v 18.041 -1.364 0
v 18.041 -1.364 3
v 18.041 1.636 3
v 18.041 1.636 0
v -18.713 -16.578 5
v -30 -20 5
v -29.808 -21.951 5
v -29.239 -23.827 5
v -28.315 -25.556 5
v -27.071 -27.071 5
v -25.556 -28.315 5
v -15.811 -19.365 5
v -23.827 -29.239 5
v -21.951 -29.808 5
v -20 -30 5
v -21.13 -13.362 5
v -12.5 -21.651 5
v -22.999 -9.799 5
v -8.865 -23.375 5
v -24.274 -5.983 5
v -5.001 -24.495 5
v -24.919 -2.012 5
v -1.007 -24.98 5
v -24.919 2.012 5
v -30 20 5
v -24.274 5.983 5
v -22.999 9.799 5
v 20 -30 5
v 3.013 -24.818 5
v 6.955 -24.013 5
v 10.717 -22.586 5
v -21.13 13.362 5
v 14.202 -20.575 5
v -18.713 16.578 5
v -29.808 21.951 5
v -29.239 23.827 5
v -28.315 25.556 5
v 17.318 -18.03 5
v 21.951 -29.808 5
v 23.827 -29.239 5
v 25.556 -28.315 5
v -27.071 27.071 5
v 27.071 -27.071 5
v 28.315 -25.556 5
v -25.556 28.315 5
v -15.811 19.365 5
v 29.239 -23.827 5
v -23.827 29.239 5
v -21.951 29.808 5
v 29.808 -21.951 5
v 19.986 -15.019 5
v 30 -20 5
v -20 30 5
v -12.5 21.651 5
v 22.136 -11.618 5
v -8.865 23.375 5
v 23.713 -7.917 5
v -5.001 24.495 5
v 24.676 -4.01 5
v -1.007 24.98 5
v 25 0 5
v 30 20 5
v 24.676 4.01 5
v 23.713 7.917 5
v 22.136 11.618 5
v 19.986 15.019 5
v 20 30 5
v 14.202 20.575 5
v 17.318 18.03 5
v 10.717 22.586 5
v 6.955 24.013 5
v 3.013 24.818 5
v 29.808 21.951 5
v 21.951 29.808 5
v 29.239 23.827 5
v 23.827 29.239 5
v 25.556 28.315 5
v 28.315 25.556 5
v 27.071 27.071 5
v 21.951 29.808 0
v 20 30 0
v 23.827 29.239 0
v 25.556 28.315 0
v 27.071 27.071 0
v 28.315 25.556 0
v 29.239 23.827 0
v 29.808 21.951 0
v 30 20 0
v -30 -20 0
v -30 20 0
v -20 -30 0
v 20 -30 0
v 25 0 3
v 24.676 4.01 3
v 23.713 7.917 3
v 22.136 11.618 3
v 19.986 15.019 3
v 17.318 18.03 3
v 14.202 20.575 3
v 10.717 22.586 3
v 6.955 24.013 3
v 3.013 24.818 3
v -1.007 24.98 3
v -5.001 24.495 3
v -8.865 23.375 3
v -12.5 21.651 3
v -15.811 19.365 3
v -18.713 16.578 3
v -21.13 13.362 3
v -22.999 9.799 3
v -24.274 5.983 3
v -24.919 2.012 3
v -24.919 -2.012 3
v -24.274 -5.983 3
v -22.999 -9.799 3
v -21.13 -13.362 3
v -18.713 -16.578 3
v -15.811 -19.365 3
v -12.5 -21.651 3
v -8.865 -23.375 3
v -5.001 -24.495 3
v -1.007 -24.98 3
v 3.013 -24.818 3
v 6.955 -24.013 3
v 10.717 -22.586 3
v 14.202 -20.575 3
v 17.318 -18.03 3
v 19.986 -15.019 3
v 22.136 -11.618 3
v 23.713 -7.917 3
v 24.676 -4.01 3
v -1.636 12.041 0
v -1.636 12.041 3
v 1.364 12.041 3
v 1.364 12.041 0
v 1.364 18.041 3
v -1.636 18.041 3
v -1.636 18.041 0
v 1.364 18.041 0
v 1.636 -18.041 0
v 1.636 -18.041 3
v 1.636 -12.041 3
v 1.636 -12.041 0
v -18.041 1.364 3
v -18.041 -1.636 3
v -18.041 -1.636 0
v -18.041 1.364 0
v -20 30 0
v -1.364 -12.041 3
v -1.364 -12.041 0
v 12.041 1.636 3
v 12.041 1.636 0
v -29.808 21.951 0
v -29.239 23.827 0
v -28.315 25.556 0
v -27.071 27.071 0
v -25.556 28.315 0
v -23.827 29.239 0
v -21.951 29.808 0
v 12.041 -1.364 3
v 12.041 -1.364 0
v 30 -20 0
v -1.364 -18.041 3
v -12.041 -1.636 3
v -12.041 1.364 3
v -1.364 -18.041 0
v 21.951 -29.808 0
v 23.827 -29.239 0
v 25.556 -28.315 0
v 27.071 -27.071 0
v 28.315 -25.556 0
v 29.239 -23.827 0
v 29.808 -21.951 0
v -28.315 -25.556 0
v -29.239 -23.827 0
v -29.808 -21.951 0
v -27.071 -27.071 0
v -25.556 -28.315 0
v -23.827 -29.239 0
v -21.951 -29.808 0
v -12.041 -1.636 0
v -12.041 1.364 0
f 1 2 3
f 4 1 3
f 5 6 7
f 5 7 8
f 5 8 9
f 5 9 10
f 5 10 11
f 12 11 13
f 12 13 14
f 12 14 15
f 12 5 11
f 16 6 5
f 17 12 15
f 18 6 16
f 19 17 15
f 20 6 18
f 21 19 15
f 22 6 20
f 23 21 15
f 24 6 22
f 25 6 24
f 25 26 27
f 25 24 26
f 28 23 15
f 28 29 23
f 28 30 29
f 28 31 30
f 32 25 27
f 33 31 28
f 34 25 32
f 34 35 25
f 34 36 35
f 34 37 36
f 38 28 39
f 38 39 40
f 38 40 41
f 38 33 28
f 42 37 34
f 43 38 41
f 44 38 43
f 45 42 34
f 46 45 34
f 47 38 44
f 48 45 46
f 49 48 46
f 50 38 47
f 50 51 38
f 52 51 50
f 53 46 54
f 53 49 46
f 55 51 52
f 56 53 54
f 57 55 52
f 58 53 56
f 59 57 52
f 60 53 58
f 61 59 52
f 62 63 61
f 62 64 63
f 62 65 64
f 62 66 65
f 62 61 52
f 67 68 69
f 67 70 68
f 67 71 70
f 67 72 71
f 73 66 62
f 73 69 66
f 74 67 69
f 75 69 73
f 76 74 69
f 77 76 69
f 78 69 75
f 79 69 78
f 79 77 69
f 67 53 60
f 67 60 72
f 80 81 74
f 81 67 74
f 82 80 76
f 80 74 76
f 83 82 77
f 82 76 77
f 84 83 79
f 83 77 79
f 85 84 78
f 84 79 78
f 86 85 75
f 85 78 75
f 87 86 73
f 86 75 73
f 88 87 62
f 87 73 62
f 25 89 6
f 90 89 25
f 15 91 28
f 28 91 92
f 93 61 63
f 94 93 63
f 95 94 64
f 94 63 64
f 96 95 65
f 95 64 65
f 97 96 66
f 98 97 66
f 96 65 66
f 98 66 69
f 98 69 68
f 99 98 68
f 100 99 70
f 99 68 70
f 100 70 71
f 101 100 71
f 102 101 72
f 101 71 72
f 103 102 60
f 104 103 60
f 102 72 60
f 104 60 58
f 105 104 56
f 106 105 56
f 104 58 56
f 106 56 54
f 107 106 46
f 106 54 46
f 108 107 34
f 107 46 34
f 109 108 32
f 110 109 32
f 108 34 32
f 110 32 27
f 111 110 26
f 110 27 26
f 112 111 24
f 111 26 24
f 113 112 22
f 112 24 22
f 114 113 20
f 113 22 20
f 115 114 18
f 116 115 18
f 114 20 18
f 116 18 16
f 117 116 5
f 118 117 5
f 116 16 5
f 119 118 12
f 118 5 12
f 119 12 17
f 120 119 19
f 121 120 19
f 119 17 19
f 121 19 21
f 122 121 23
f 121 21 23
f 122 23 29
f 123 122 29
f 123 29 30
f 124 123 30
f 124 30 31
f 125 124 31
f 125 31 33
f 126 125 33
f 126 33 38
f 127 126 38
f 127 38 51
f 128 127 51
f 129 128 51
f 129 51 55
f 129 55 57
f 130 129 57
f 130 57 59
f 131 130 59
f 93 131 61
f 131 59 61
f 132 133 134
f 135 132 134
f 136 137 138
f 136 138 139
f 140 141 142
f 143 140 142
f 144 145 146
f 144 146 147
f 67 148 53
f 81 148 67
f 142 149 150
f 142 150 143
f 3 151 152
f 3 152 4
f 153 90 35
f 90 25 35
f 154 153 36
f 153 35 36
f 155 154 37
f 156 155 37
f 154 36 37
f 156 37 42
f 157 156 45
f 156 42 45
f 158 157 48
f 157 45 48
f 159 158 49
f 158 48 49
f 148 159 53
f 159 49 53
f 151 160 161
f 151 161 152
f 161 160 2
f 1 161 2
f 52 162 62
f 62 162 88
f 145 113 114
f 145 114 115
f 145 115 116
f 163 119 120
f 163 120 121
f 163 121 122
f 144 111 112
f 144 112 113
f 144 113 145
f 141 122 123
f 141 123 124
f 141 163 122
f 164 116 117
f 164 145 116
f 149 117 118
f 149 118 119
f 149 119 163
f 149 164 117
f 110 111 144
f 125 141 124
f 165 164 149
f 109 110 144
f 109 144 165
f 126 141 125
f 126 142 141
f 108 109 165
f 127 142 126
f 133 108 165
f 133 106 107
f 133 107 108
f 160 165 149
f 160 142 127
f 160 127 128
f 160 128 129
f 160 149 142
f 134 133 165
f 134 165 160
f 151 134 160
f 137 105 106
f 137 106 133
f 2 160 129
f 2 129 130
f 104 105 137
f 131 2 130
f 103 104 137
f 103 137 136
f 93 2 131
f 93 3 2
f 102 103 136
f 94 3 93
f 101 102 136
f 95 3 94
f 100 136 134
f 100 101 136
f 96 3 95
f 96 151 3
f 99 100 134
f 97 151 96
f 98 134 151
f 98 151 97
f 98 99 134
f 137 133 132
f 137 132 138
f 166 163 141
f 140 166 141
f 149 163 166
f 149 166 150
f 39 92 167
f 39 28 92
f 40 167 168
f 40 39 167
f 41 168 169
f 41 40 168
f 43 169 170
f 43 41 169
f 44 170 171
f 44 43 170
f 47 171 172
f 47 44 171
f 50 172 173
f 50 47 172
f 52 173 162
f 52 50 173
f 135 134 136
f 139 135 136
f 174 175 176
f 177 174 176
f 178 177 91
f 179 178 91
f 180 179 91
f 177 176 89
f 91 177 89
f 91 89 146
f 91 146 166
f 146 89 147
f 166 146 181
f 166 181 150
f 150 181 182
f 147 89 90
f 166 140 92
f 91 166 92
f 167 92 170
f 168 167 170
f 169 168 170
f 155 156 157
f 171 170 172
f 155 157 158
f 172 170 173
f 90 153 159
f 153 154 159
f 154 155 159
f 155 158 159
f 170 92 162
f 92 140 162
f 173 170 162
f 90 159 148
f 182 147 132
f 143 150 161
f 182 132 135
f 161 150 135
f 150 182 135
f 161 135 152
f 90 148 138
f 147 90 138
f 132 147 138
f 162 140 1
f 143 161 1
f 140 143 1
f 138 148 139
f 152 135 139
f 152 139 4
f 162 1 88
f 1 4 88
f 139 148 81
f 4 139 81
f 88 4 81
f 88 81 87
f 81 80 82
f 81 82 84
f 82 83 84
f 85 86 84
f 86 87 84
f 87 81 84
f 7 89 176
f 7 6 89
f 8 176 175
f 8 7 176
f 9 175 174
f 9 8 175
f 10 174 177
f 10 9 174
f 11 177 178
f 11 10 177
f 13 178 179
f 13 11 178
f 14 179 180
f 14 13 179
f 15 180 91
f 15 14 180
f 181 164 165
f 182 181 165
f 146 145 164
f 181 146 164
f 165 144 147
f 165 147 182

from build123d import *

# Parameters (mm, degrees)
F0_W     = 60
F0_H     = 60
F1_DEPTH = 5
F2_R     = 25
F3_DEPTH = 2
F4_R     = 10
F5_W     = 6
F5_H     = 3
F5_W_2   = 3
F5_H_2   = 6
F6_DEPTH = 25


with BuildPart() as f1:
    # F0 (on Top) → F1 (new body)
    with BuildSketch(Plane.XY):
        Rectangle(F0_W, F0_H)
    extrude(amount=F1_DEPTH)

    # F2 (on face) → F3 (cut)
    with BuildSketch(Plane.XY.offset(5)):
        Circle(F2_R)
    extrude(amount=-F3_DEPTH, mode=Mode.SUBTRACT)

    # F4
    f4_edges = [f1.edges().sort_by_distance(p)[0] for p in [
        (-30, 30, 2.5),
        (30, 30, 2.5),
        (30, -30, 2.5),
        (-30, -30, 2.5),
    ]]
    fillet(f4_edges, radius=F4_R)

    # F5 (on face) → F6 (cut)
    with BuildSketch(Plane.XY.offset(3)):
        with Locations((-15.041312, -0.136277)):
            Rectangle(F5_W, F5_H)
        with Locations((-0.136277, 15.041312)):
            Rectangle(F5_W_2, F5_H_2)
        with Locations((0.136277, -15.041312)):
            Rectangle(F5_W_2, F5_H_2)
        with Locations((15.041312, 0.136277)):
            Rectangle(F5_W, F5_H)
    extrude(amount=-F6_DEPTH, mode=Mode.SUBTRACT)


solid = f1.part
